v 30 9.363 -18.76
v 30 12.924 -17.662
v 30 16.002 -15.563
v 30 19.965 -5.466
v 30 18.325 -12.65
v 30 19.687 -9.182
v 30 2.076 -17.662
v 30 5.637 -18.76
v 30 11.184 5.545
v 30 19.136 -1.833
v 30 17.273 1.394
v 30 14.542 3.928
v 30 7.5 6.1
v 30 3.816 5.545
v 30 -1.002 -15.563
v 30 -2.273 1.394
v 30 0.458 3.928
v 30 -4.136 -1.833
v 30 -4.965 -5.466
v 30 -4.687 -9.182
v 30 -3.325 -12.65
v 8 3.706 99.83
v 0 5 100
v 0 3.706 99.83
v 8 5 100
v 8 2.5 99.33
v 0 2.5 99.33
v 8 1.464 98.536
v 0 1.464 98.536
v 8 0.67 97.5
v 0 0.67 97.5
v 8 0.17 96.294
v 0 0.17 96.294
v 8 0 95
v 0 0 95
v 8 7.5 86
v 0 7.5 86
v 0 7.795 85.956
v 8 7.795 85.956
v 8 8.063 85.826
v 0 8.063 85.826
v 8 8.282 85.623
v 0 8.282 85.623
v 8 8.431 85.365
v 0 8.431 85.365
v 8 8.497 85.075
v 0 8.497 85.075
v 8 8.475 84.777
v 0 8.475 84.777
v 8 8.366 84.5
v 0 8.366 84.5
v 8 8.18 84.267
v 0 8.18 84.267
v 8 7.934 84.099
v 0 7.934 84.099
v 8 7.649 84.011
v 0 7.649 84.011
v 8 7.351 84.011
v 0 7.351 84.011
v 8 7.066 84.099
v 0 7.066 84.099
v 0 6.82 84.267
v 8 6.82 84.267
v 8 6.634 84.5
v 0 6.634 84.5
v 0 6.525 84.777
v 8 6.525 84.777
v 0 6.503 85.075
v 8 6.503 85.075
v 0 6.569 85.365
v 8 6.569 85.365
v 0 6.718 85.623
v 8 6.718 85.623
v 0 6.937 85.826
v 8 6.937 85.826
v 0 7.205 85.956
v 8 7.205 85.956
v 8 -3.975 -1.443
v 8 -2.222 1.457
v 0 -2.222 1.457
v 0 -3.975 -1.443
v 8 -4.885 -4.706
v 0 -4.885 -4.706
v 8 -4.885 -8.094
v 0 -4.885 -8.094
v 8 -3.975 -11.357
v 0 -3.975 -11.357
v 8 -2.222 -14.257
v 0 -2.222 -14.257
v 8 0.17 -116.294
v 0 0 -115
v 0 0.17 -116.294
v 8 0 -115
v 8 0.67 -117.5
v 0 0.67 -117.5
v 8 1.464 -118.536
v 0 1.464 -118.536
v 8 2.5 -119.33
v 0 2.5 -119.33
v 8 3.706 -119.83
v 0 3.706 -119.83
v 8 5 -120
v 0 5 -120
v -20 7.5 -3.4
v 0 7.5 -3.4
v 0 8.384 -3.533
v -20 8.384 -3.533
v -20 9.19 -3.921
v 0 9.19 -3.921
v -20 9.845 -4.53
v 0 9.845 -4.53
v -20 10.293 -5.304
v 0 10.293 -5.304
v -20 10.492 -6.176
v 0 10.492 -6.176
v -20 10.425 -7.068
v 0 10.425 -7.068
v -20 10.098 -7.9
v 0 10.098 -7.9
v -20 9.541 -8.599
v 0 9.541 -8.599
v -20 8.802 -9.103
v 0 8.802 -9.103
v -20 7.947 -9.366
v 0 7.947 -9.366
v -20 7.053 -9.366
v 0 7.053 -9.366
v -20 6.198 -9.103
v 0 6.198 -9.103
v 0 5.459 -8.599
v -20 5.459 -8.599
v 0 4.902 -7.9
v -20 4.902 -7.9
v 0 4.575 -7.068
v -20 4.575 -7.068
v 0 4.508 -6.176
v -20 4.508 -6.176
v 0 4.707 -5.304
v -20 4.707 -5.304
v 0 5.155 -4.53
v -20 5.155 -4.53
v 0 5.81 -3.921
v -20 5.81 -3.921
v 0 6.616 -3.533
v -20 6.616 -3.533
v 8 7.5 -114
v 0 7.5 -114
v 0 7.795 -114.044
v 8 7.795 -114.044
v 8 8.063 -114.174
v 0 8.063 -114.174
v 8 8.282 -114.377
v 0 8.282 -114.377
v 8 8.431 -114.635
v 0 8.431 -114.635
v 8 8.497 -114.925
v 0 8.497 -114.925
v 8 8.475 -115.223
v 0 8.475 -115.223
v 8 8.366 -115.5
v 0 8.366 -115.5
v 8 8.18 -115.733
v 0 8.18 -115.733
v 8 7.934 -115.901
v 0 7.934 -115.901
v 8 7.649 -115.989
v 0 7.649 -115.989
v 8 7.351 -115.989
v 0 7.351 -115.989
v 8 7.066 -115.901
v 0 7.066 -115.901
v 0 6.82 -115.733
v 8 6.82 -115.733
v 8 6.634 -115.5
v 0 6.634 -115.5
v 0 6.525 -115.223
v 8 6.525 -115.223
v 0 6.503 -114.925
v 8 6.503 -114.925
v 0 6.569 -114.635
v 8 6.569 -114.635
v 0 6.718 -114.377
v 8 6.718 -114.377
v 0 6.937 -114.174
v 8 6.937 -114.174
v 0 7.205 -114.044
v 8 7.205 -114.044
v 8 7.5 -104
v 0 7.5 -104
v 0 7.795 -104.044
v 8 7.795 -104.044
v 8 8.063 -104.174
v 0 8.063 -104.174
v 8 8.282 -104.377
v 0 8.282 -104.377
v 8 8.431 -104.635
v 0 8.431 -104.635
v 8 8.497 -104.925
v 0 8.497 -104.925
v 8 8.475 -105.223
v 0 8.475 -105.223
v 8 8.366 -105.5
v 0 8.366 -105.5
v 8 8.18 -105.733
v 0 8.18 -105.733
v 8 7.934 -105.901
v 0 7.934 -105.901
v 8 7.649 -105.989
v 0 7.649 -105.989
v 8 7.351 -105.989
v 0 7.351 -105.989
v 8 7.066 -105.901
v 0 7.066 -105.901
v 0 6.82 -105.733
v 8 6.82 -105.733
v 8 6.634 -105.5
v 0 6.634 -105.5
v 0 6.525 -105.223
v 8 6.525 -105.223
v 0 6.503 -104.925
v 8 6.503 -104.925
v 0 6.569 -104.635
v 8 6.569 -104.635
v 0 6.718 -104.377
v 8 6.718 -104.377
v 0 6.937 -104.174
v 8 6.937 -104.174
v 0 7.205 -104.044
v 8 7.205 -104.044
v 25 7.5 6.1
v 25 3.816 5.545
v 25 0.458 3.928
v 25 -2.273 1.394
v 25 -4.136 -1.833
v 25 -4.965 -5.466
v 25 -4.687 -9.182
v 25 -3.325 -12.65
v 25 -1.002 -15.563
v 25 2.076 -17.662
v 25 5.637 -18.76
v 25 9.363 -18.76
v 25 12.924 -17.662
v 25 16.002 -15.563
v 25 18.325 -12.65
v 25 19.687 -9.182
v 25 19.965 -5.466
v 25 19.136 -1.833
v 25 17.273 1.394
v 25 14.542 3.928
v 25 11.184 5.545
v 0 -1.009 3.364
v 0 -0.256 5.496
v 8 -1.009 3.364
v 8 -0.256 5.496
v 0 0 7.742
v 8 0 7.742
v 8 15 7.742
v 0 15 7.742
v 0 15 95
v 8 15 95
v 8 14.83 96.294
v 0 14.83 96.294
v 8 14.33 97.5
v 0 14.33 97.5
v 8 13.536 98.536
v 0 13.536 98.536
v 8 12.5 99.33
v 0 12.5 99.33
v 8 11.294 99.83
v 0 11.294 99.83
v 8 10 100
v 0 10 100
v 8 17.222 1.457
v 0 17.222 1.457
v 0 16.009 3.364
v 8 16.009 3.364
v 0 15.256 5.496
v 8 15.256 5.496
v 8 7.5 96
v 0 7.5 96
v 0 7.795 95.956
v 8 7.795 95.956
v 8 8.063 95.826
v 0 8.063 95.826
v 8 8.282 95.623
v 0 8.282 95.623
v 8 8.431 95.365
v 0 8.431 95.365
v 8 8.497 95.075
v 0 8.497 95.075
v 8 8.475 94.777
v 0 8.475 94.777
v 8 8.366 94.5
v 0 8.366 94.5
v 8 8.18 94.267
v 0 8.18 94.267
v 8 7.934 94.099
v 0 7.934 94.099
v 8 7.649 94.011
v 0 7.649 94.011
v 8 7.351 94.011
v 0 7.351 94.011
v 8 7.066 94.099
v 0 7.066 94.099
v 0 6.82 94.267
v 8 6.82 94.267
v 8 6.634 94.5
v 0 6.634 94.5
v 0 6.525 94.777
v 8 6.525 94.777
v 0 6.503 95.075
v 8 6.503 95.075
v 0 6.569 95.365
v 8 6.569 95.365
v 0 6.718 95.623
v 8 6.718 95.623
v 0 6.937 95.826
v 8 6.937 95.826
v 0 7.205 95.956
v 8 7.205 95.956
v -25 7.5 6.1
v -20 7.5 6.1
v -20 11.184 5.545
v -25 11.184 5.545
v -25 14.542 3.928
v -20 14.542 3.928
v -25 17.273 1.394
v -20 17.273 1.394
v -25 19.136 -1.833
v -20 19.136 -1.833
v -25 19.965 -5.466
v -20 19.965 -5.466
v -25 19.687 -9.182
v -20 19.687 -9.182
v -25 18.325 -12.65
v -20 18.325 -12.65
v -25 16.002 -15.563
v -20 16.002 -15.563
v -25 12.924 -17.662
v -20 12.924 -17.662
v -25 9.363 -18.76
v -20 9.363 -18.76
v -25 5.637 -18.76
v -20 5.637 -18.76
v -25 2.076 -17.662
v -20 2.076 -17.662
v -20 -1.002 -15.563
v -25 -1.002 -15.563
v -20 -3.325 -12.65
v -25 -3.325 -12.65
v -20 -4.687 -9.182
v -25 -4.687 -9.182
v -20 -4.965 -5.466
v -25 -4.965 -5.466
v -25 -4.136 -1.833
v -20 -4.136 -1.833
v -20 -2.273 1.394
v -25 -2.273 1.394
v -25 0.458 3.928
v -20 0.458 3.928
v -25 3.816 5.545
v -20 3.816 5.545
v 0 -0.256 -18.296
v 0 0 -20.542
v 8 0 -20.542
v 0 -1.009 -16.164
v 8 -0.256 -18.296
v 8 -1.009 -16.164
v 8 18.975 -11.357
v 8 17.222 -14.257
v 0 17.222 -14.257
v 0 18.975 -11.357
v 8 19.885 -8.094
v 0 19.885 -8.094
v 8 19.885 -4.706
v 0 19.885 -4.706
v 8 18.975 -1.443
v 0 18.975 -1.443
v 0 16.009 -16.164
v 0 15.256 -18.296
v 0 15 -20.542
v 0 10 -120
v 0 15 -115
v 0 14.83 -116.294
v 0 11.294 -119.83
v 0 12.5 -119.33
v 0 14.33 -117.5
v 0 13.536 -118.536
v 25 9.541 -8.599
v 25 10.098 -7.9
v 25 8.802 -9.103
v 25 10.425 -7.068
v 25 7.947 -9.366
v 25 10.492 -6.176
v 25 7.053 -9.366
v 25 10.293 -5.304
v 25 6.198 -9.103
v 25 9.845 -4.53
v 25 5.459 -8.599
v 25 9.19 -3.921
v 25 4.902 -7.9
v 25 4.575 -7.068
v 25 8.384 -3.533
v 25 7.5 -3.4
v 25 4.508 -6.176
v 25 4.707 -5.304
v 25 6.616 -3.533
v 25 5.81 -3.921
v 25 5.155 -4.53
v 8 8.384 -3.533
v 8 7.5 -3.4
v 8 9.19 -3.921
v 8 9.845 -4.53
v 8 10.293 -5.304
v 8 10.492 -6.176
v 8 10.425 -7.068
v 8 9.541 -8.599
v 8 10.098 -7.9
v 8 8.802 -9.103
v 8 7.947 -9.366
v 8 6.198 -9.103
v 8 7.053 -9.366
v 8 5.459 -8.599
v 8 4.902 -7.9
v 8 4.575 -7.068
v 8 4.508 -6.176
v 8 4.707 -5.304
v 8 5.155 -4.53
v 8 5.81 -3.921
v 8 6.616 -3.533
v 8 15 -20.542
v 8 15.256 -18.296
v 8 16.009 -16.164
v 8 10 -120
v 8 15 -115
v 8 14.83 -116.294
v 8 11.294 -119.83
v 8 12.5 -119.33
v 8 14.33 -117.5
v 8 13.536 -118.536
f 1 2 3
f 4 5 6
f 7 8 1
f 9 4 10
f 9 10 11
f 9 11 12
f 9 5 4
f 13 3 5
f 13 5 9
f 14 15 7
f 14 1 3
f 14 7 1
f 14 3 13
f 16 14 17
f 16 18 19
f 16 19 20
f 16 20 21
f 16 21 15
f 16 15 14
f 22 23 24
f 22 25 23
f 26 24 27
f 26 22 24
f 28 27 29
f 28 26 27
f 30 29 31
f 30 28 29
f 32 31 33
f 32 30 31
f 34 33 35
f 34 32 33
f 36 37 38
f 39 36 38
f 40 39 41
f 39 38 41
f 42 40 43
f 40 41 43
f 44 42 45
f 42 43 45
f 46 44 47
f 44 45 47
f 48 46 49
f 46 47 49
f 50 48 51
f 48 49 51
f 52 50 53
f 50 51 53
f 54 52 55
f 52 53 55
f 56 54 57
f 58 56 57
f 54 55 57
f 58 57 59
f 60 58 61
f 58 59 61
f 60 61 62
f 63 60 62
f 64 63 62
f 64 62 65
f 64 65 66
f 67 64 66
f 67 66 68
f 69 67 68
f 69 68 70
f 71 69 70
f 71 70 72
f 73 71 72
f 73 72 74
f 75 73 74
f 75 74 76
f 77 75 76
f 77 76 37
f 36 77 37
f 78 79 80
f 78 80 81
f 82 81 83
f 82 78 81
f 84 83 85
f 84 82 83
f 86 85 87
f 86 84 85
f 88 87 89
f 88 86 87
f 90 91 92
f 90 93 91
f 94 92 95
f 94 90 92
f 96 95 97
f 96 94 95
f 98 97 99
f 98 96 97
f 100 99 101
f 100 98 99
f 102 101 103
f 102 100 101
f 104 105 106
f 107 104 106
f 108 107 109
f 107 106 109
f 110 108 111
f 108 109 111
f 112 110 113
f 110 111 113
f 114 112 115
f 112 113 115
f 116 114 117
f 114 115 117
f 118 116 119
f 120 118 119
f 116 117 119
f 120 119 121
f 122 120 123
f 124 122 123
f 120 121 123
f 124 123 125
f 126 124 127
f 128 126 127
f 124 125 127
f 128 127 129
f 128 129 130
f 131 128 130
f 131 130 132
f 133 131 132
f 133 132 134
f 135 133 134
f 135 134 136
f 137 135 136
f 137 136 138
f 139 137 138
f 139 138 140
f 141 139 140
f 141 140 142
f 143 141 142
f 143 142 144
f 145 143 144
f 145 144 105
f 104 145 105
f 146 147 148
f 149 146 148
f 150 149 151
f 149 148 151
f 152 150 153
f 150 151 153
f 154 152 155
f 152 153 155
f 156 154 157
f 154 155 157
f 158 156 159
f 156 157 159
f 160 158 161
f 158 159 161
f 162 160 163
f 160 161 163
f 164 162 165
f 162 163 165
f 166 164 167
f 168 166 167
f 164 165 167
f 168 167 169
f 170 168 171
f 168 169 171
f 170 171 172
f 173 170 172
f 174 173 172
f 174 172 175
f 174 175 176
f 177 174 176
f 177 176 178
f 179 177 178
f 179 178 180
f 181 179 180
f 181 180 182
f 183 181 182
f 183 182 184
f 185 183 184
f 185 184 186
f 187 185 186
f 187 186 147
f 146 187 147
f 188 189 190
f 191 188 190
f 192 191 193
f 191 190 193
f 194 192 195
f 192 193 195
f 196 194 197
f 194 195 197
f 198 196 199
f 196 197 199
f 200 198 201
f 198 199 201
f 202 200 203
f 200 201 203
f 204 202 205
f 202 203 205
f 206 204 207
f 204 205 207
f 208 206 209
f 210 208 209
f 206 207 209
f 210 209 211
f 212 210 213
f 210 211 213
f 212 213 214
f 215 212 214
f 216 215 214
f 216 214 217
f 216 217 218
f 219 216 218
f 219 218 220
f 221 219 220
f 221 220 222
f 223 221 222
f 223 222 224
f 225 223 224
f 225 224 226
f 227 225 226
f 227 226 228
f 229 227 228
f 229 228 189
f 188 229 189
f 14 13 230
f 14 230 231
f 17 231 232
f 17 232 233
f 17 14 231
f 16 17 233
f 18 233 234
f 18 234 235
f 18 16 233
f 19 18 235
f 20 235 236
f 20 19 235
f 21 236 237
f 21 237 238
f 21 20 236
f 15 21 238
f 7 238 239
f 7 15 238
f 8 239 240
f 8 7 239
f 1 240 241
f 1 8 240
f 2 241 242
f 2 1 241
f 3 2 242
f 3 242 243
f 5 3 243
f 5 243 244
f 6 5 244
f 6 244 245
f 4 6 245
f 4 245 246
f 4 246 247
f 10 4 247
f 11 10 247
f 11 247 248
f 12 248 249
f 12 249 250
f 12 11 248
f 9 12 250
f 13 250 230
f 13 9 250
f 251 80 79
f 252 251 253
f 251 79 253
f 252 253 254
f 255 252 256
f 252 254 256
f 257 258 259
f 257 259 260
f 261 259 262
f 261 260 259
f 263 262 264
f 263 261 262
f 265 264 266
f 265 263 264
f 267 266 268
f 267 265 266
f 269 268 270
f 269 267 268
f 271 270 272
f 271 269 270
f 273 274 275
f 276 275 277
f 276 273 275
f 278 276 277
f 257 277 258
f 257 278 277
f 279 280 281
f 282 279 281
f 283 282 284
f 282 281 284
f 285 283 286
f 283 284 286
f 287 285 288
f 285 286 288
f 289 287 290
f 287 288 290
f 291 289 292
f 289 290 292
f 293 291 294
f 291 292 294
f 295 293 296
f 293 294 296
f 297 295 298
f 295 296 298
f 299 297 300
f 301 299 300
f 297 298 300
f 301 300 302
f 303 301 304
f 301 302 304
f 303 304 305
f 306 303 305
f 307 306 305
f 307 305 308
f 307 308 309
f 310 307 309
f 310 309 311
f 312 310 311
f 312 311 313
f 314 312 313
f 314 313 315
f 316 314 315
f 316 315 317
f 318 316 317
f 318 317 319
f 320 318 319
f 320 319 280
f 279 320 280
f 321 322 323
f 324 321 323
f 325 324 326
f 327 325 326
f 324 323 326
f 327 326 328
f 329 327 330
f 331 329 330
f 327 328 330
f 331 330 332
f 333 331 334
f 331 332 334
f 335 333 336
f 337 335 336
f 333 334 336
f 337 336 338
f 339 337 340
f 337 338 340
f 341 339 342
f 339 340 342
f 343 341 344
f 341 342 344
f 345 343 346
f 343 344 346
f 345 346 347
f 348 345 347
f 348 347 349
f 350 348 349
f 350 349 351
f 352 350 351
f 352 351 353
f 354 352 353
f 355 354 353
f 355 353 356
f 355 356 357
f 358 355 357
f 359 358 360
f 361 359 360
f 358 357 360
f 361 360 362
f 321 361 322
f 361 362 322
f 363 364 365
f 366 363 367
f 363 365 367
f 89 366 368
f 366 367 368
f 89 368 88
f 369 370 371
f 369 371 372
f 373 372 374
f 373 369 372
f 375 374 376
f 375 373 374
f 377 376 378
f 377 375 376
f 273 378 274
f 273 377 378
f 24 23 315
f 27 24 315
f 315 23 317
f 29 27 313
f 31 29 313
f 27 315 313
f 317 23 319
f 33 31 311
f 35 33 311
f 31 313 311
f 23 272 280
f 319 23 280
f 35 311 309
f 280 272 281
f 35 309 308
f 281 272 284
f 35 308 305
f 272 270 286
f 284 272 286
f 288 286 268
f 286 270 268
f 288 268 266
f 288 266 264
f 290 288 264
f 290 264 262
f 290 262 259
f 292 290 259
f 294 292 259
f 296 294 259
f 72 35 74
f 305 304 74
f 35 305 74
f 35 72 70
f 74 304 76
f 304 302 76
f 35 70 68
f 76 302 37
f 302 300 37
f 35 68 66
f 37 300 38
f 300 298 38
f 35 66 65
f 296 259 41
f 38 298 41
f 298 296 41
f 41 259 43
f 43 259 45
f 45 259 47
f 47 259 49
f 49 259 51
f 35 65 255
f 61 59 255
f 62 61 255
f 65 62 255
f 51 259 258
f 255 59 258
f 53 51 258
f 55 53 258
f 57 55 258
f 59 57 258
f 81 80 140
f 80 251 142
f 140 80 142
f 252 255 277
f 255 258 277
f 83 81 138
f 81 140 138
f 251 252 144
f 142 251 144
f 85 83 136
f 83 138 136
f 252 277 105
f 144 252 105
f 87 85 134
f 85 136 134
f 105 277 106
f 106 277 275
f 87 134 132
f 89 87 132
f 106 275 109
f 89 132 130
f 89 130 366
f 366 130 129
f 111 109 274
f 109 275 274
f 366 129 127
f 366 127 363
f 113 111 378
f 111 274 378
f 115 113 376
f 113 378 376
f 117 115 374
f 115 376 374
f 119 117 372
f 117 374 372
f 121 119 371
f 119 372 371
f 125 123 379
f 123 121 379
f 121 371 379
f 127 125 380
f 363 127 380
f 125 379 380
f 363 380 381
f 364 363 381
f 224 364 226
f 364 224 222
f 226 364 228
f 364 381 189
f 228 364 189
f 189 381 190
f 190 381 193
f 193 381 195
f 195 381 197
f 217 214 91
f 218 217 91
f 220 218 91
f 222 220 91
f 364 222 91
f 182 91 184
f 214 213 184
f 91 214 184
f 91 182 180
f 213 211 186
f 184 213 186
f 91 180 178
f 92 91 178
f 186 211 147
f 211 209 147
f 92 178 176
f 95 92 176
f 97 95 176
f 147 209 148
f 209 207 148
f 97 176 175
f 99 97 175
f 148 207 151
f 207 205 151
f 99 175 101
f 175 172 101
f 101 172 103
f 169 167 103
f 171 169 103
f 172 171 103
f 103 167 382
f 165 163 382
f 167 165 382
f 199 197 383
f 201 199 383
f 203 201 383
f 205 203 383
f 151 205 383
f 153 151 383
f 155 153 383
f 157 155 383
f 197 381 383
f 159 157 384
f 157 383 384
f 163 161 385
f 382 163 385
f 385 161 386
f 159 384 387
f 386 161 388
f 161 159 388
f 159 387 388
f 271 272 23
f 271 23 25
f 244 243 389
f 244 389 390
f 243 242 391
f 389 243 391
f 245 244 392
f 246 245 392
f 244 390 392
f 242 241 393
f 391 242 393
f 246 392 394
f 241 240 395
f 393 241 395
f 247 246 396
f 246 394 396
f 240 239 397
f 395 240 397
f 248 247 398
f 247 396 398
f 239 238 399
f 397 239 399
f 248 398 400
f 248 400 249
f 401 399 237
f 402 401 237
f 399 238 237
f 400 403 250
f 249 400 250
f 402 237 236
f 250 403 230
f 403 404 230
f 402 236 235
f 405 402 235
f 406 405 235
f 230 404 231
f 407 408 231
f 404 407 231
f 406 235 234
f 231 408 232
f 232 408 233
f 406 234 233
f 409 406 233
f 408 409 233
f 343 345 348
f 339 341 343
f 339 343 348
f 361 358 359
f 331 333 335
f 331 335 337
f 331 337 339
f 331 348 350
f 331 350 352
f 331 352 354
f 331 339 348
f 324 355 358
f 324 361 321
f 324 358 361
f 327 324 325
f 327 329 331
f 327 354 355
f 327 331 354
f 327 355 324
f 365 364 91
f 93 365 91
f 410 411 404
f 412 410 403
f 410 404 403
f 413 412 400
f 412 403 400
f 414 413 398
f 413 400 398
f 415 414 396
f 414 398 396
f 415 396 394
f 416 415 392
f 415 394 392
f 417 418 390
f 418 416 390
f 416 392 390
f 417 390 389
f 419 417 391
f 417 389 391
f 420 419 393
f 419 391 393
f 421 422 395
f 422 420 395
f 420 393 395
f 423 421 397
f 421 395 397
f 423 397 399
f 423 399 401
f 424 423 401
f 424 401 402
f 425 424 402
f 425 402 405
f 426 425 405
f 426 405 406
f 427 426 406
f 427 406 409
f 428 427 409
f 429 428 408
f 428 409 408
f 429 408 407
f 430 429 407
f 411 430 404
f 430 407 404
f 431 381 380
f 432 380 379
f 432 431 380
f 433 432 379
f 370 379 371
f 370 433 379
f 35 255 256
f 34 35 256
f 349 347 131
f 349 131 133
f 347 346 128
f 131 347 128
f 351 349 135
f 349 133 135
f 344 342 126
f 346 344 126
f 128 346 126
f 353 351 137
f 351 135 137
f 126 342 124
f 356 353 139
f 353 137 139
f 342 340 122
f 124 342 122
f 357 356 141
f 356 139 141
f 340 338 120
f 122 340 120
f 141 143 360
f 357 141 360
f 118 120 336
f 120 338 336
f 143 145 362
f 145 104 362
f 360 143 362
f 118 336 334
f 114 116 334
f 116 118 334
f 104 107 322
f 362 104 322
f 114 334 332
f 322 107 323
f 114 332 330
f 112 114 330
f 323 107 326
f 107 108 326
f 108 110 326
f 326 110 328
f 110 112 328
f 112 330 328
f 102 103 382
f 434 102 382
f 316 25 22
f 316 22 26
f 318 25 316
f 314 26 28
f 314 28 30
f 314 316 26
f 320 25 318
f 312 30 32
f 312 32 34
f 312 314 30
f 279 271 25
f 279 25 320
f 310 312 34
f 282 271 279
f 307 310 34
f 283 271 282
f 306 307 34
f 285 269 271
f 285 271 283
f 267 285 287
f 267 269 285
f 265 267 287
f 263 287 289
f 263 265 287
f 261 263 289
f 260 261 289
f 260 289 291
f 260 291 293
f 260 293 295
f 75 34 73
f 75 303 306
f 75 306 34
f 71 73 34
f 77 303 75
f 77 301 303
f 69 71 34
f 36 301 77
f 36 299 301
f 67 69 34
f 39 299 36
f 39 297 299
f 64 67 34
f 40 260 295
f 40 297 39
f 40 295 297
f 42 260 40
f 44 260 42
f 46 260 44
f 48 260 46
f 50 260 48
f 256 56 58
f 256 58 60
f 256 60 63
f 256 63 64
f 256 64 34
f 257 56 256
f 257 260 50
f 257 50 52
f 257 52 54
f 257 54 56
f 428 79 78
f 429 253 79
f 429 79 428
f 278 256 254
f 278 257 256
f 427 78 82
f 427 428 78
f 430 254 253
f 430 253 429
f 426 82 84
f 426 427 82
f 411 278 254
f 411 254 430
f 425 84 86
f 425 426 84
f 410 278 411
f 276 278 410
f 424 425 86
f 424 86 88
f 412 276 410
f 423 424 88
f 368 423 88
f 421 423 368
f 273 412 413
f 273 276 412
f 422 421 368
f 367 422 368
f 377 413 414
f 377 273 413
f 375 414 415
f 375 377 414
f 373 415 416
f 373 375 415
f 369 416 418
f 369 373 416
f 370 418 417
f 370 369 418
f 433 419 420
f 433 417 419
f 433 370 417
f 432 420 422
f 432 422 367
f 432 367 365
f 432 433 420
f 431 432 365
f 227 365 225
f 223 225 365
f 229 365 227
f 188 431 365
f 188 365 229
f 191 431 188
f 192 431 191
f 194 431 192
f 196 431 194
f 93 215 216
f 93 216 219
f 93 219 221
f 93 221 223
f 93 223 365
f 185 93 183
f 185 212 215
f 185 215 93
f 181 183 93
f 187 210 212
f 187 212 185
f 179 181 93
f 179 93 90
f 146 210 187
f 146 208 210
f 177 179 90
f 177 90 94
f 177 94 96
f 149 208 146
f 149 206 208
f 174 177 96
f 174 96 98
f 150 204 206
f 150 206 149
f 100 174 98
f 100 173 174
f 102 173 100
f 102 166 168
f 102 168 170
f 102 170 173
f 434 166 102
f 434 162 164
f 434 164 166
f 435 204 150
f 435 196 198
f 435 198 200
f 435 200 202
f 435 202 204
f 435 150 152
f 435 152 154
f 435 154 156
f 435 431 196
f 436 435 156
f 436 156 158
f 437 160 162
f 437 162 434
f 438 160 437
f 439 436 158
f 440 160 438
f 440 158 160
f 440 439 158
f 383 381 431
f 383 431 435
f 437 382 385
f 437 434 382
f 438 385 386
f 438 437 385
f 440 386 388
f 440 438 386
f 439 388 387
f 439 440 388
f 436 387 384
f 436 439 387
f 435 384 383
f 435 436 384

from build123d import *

# Parameters (mm, degrees)
SKETCH_1_W           = 120
SKETCH_1_H           = 15
EXTRUDE_1_DEPTH      = 8
FILLET_1_R           = 5
SKETCH_6_R           = 12.5
EXTRUDE_2_DEPTH      = 8
SKETCH_9_W           = 8
SKETCH_9_H           = 15
EXTRUDE_3_DEPTH      = 100
FILLET_2_R           = 10
FILLET_4_R           = 5
SKETCH_11_R          = 1
CUT_EXTRUDE_8_DEPTH  = 10
EXTRUDE_5_DEPTH      = 20
EXTRUDE_5_DEPTH_BACK = 25
SKETCH_15_R          = 3
SKETCH_16_R          = 12.5
EXTRUDE_6_DEPTH      = 5
EXTRUDE_START        = 5
SKETCH_17_R          = 12.5
EXTRUDE_7_DEPTH      = 5


with BuildPart() as part:
    # 草图1 → 凸台-拉伸1 (new body)
    with BuildSketch(Plane(origin=(0, 0, 0), x_dir=(0, 0, -1), z_dir=(1, 0, 0))):
        with Locations((60, 7.5)):
            Rectangle(SKETCH_1_W, SKETCH_1_H)
    extrude(amount=EXTRUDE_1_DEPTH)

    # 圆角1
    fillet_1_edges = [part.edges().sort_by_distance(p)[0] for p in [
        (4, 15, 0),
        (4, 15, -120),
        (4, 0, -120),
        (4, 0, 0),
    ]]
    fillet(fillet_1_edges, radius=FILLET_1_R)

    # 草图6 → 凸台-拉伸2 (add)
    with BuildSketch(Plane(origin=(8, 0, 0), x_dir=(0, 0, -1), z_dir=(1, 0, 0))):
        with Locations((6.4, 7.5)):
            Circle(SKETCH_6_R)
    extrude(amount=-EXTRUDE_2_DEPTH)

    # 草图9 → 凸台-拉伸3 (add)
    with BuildSketch(Plane.XY):
        with Locations((4, 7.5)):
            Rectangle(SKETCH_9_W, SKETCH_9_H)
    extrude(amount=EXTRUDE_3_DEPTH)

    # 圆角2
    fillet_2_edges = [part.edges().sort_by_distance(p)[0] for p in [
        (4, 0, -16.4),
        (4, 15, -16.4),
        (4, 15, 3.6),
        (4, 0, 3.6),
    ]]
    fillet(fillet_2_edges, radius=FILLET_2_R)

    # 圆角4
    fillet_4_edges = [part.edges().sort_by_distance(p)[0] for p in [
        (4, 0, 100),
        (4, 15, 100),
    ]]
    fillet(fillet_4_edges, radius=FILLET_4_R)

    # 草图11 → 切除-拉伸8 (cut)
    with BuildSketch(Plane.ZY):
        with Locations((-115, 7.5)):
            Circle(SKETCH_11_R)
        with Locations((-105, 7.5)):
            Circle(SKETCH_11_R)
        with Locations((85, 7.5)):
            Circle(SKETCH_11_R)
        with Locations((95, 7.5)):
            Circle(SKETCH_11_R)
    extrude(amount=-CUT_EXTRUDE_8_DEPTH, mode=Mode.SUBTRACT)

    # 草图15 → 凸台-拉伸5 (add, two sides: drawn at the far end of the back side and taken through both)
    with BuildSketch(Plane.ZY.offset(-EXTRUDE_5_DEPTH_BACK)):
        with Locations((-6.4, 7.5)):
            Circle(SKETCH_15_R)
    extrude(amount=EXTRUDE_5_DEPTH + EXTRUDE_5_DEPTH_BACK)

    # 草图16 → 凸台-拉伸6 (add)
    with BuildSketch(Plane.ZY.offset(20)):
        with Locations((-6.4, 7.5)):
            Circle(SKETCH_16_R)
    extrude(amount=EXTRUDE_6_DEPTH)

    # 草图17 → 凸台-拉伸7 (add)
    with BuildSketch(Plane(origin=(25, 0, 0), x_dir=(0, 0, -1), z_dir=(1, 0, 0)).offset(EXTRUDE_START)):
        with Locations(Location((6.4, 7.5, 0), (0, 0, 180))):
            Circle(SKETCH_17_R)
    extrude(amount=-EXTRUDE_7_DEPTH)


solid = part.part
